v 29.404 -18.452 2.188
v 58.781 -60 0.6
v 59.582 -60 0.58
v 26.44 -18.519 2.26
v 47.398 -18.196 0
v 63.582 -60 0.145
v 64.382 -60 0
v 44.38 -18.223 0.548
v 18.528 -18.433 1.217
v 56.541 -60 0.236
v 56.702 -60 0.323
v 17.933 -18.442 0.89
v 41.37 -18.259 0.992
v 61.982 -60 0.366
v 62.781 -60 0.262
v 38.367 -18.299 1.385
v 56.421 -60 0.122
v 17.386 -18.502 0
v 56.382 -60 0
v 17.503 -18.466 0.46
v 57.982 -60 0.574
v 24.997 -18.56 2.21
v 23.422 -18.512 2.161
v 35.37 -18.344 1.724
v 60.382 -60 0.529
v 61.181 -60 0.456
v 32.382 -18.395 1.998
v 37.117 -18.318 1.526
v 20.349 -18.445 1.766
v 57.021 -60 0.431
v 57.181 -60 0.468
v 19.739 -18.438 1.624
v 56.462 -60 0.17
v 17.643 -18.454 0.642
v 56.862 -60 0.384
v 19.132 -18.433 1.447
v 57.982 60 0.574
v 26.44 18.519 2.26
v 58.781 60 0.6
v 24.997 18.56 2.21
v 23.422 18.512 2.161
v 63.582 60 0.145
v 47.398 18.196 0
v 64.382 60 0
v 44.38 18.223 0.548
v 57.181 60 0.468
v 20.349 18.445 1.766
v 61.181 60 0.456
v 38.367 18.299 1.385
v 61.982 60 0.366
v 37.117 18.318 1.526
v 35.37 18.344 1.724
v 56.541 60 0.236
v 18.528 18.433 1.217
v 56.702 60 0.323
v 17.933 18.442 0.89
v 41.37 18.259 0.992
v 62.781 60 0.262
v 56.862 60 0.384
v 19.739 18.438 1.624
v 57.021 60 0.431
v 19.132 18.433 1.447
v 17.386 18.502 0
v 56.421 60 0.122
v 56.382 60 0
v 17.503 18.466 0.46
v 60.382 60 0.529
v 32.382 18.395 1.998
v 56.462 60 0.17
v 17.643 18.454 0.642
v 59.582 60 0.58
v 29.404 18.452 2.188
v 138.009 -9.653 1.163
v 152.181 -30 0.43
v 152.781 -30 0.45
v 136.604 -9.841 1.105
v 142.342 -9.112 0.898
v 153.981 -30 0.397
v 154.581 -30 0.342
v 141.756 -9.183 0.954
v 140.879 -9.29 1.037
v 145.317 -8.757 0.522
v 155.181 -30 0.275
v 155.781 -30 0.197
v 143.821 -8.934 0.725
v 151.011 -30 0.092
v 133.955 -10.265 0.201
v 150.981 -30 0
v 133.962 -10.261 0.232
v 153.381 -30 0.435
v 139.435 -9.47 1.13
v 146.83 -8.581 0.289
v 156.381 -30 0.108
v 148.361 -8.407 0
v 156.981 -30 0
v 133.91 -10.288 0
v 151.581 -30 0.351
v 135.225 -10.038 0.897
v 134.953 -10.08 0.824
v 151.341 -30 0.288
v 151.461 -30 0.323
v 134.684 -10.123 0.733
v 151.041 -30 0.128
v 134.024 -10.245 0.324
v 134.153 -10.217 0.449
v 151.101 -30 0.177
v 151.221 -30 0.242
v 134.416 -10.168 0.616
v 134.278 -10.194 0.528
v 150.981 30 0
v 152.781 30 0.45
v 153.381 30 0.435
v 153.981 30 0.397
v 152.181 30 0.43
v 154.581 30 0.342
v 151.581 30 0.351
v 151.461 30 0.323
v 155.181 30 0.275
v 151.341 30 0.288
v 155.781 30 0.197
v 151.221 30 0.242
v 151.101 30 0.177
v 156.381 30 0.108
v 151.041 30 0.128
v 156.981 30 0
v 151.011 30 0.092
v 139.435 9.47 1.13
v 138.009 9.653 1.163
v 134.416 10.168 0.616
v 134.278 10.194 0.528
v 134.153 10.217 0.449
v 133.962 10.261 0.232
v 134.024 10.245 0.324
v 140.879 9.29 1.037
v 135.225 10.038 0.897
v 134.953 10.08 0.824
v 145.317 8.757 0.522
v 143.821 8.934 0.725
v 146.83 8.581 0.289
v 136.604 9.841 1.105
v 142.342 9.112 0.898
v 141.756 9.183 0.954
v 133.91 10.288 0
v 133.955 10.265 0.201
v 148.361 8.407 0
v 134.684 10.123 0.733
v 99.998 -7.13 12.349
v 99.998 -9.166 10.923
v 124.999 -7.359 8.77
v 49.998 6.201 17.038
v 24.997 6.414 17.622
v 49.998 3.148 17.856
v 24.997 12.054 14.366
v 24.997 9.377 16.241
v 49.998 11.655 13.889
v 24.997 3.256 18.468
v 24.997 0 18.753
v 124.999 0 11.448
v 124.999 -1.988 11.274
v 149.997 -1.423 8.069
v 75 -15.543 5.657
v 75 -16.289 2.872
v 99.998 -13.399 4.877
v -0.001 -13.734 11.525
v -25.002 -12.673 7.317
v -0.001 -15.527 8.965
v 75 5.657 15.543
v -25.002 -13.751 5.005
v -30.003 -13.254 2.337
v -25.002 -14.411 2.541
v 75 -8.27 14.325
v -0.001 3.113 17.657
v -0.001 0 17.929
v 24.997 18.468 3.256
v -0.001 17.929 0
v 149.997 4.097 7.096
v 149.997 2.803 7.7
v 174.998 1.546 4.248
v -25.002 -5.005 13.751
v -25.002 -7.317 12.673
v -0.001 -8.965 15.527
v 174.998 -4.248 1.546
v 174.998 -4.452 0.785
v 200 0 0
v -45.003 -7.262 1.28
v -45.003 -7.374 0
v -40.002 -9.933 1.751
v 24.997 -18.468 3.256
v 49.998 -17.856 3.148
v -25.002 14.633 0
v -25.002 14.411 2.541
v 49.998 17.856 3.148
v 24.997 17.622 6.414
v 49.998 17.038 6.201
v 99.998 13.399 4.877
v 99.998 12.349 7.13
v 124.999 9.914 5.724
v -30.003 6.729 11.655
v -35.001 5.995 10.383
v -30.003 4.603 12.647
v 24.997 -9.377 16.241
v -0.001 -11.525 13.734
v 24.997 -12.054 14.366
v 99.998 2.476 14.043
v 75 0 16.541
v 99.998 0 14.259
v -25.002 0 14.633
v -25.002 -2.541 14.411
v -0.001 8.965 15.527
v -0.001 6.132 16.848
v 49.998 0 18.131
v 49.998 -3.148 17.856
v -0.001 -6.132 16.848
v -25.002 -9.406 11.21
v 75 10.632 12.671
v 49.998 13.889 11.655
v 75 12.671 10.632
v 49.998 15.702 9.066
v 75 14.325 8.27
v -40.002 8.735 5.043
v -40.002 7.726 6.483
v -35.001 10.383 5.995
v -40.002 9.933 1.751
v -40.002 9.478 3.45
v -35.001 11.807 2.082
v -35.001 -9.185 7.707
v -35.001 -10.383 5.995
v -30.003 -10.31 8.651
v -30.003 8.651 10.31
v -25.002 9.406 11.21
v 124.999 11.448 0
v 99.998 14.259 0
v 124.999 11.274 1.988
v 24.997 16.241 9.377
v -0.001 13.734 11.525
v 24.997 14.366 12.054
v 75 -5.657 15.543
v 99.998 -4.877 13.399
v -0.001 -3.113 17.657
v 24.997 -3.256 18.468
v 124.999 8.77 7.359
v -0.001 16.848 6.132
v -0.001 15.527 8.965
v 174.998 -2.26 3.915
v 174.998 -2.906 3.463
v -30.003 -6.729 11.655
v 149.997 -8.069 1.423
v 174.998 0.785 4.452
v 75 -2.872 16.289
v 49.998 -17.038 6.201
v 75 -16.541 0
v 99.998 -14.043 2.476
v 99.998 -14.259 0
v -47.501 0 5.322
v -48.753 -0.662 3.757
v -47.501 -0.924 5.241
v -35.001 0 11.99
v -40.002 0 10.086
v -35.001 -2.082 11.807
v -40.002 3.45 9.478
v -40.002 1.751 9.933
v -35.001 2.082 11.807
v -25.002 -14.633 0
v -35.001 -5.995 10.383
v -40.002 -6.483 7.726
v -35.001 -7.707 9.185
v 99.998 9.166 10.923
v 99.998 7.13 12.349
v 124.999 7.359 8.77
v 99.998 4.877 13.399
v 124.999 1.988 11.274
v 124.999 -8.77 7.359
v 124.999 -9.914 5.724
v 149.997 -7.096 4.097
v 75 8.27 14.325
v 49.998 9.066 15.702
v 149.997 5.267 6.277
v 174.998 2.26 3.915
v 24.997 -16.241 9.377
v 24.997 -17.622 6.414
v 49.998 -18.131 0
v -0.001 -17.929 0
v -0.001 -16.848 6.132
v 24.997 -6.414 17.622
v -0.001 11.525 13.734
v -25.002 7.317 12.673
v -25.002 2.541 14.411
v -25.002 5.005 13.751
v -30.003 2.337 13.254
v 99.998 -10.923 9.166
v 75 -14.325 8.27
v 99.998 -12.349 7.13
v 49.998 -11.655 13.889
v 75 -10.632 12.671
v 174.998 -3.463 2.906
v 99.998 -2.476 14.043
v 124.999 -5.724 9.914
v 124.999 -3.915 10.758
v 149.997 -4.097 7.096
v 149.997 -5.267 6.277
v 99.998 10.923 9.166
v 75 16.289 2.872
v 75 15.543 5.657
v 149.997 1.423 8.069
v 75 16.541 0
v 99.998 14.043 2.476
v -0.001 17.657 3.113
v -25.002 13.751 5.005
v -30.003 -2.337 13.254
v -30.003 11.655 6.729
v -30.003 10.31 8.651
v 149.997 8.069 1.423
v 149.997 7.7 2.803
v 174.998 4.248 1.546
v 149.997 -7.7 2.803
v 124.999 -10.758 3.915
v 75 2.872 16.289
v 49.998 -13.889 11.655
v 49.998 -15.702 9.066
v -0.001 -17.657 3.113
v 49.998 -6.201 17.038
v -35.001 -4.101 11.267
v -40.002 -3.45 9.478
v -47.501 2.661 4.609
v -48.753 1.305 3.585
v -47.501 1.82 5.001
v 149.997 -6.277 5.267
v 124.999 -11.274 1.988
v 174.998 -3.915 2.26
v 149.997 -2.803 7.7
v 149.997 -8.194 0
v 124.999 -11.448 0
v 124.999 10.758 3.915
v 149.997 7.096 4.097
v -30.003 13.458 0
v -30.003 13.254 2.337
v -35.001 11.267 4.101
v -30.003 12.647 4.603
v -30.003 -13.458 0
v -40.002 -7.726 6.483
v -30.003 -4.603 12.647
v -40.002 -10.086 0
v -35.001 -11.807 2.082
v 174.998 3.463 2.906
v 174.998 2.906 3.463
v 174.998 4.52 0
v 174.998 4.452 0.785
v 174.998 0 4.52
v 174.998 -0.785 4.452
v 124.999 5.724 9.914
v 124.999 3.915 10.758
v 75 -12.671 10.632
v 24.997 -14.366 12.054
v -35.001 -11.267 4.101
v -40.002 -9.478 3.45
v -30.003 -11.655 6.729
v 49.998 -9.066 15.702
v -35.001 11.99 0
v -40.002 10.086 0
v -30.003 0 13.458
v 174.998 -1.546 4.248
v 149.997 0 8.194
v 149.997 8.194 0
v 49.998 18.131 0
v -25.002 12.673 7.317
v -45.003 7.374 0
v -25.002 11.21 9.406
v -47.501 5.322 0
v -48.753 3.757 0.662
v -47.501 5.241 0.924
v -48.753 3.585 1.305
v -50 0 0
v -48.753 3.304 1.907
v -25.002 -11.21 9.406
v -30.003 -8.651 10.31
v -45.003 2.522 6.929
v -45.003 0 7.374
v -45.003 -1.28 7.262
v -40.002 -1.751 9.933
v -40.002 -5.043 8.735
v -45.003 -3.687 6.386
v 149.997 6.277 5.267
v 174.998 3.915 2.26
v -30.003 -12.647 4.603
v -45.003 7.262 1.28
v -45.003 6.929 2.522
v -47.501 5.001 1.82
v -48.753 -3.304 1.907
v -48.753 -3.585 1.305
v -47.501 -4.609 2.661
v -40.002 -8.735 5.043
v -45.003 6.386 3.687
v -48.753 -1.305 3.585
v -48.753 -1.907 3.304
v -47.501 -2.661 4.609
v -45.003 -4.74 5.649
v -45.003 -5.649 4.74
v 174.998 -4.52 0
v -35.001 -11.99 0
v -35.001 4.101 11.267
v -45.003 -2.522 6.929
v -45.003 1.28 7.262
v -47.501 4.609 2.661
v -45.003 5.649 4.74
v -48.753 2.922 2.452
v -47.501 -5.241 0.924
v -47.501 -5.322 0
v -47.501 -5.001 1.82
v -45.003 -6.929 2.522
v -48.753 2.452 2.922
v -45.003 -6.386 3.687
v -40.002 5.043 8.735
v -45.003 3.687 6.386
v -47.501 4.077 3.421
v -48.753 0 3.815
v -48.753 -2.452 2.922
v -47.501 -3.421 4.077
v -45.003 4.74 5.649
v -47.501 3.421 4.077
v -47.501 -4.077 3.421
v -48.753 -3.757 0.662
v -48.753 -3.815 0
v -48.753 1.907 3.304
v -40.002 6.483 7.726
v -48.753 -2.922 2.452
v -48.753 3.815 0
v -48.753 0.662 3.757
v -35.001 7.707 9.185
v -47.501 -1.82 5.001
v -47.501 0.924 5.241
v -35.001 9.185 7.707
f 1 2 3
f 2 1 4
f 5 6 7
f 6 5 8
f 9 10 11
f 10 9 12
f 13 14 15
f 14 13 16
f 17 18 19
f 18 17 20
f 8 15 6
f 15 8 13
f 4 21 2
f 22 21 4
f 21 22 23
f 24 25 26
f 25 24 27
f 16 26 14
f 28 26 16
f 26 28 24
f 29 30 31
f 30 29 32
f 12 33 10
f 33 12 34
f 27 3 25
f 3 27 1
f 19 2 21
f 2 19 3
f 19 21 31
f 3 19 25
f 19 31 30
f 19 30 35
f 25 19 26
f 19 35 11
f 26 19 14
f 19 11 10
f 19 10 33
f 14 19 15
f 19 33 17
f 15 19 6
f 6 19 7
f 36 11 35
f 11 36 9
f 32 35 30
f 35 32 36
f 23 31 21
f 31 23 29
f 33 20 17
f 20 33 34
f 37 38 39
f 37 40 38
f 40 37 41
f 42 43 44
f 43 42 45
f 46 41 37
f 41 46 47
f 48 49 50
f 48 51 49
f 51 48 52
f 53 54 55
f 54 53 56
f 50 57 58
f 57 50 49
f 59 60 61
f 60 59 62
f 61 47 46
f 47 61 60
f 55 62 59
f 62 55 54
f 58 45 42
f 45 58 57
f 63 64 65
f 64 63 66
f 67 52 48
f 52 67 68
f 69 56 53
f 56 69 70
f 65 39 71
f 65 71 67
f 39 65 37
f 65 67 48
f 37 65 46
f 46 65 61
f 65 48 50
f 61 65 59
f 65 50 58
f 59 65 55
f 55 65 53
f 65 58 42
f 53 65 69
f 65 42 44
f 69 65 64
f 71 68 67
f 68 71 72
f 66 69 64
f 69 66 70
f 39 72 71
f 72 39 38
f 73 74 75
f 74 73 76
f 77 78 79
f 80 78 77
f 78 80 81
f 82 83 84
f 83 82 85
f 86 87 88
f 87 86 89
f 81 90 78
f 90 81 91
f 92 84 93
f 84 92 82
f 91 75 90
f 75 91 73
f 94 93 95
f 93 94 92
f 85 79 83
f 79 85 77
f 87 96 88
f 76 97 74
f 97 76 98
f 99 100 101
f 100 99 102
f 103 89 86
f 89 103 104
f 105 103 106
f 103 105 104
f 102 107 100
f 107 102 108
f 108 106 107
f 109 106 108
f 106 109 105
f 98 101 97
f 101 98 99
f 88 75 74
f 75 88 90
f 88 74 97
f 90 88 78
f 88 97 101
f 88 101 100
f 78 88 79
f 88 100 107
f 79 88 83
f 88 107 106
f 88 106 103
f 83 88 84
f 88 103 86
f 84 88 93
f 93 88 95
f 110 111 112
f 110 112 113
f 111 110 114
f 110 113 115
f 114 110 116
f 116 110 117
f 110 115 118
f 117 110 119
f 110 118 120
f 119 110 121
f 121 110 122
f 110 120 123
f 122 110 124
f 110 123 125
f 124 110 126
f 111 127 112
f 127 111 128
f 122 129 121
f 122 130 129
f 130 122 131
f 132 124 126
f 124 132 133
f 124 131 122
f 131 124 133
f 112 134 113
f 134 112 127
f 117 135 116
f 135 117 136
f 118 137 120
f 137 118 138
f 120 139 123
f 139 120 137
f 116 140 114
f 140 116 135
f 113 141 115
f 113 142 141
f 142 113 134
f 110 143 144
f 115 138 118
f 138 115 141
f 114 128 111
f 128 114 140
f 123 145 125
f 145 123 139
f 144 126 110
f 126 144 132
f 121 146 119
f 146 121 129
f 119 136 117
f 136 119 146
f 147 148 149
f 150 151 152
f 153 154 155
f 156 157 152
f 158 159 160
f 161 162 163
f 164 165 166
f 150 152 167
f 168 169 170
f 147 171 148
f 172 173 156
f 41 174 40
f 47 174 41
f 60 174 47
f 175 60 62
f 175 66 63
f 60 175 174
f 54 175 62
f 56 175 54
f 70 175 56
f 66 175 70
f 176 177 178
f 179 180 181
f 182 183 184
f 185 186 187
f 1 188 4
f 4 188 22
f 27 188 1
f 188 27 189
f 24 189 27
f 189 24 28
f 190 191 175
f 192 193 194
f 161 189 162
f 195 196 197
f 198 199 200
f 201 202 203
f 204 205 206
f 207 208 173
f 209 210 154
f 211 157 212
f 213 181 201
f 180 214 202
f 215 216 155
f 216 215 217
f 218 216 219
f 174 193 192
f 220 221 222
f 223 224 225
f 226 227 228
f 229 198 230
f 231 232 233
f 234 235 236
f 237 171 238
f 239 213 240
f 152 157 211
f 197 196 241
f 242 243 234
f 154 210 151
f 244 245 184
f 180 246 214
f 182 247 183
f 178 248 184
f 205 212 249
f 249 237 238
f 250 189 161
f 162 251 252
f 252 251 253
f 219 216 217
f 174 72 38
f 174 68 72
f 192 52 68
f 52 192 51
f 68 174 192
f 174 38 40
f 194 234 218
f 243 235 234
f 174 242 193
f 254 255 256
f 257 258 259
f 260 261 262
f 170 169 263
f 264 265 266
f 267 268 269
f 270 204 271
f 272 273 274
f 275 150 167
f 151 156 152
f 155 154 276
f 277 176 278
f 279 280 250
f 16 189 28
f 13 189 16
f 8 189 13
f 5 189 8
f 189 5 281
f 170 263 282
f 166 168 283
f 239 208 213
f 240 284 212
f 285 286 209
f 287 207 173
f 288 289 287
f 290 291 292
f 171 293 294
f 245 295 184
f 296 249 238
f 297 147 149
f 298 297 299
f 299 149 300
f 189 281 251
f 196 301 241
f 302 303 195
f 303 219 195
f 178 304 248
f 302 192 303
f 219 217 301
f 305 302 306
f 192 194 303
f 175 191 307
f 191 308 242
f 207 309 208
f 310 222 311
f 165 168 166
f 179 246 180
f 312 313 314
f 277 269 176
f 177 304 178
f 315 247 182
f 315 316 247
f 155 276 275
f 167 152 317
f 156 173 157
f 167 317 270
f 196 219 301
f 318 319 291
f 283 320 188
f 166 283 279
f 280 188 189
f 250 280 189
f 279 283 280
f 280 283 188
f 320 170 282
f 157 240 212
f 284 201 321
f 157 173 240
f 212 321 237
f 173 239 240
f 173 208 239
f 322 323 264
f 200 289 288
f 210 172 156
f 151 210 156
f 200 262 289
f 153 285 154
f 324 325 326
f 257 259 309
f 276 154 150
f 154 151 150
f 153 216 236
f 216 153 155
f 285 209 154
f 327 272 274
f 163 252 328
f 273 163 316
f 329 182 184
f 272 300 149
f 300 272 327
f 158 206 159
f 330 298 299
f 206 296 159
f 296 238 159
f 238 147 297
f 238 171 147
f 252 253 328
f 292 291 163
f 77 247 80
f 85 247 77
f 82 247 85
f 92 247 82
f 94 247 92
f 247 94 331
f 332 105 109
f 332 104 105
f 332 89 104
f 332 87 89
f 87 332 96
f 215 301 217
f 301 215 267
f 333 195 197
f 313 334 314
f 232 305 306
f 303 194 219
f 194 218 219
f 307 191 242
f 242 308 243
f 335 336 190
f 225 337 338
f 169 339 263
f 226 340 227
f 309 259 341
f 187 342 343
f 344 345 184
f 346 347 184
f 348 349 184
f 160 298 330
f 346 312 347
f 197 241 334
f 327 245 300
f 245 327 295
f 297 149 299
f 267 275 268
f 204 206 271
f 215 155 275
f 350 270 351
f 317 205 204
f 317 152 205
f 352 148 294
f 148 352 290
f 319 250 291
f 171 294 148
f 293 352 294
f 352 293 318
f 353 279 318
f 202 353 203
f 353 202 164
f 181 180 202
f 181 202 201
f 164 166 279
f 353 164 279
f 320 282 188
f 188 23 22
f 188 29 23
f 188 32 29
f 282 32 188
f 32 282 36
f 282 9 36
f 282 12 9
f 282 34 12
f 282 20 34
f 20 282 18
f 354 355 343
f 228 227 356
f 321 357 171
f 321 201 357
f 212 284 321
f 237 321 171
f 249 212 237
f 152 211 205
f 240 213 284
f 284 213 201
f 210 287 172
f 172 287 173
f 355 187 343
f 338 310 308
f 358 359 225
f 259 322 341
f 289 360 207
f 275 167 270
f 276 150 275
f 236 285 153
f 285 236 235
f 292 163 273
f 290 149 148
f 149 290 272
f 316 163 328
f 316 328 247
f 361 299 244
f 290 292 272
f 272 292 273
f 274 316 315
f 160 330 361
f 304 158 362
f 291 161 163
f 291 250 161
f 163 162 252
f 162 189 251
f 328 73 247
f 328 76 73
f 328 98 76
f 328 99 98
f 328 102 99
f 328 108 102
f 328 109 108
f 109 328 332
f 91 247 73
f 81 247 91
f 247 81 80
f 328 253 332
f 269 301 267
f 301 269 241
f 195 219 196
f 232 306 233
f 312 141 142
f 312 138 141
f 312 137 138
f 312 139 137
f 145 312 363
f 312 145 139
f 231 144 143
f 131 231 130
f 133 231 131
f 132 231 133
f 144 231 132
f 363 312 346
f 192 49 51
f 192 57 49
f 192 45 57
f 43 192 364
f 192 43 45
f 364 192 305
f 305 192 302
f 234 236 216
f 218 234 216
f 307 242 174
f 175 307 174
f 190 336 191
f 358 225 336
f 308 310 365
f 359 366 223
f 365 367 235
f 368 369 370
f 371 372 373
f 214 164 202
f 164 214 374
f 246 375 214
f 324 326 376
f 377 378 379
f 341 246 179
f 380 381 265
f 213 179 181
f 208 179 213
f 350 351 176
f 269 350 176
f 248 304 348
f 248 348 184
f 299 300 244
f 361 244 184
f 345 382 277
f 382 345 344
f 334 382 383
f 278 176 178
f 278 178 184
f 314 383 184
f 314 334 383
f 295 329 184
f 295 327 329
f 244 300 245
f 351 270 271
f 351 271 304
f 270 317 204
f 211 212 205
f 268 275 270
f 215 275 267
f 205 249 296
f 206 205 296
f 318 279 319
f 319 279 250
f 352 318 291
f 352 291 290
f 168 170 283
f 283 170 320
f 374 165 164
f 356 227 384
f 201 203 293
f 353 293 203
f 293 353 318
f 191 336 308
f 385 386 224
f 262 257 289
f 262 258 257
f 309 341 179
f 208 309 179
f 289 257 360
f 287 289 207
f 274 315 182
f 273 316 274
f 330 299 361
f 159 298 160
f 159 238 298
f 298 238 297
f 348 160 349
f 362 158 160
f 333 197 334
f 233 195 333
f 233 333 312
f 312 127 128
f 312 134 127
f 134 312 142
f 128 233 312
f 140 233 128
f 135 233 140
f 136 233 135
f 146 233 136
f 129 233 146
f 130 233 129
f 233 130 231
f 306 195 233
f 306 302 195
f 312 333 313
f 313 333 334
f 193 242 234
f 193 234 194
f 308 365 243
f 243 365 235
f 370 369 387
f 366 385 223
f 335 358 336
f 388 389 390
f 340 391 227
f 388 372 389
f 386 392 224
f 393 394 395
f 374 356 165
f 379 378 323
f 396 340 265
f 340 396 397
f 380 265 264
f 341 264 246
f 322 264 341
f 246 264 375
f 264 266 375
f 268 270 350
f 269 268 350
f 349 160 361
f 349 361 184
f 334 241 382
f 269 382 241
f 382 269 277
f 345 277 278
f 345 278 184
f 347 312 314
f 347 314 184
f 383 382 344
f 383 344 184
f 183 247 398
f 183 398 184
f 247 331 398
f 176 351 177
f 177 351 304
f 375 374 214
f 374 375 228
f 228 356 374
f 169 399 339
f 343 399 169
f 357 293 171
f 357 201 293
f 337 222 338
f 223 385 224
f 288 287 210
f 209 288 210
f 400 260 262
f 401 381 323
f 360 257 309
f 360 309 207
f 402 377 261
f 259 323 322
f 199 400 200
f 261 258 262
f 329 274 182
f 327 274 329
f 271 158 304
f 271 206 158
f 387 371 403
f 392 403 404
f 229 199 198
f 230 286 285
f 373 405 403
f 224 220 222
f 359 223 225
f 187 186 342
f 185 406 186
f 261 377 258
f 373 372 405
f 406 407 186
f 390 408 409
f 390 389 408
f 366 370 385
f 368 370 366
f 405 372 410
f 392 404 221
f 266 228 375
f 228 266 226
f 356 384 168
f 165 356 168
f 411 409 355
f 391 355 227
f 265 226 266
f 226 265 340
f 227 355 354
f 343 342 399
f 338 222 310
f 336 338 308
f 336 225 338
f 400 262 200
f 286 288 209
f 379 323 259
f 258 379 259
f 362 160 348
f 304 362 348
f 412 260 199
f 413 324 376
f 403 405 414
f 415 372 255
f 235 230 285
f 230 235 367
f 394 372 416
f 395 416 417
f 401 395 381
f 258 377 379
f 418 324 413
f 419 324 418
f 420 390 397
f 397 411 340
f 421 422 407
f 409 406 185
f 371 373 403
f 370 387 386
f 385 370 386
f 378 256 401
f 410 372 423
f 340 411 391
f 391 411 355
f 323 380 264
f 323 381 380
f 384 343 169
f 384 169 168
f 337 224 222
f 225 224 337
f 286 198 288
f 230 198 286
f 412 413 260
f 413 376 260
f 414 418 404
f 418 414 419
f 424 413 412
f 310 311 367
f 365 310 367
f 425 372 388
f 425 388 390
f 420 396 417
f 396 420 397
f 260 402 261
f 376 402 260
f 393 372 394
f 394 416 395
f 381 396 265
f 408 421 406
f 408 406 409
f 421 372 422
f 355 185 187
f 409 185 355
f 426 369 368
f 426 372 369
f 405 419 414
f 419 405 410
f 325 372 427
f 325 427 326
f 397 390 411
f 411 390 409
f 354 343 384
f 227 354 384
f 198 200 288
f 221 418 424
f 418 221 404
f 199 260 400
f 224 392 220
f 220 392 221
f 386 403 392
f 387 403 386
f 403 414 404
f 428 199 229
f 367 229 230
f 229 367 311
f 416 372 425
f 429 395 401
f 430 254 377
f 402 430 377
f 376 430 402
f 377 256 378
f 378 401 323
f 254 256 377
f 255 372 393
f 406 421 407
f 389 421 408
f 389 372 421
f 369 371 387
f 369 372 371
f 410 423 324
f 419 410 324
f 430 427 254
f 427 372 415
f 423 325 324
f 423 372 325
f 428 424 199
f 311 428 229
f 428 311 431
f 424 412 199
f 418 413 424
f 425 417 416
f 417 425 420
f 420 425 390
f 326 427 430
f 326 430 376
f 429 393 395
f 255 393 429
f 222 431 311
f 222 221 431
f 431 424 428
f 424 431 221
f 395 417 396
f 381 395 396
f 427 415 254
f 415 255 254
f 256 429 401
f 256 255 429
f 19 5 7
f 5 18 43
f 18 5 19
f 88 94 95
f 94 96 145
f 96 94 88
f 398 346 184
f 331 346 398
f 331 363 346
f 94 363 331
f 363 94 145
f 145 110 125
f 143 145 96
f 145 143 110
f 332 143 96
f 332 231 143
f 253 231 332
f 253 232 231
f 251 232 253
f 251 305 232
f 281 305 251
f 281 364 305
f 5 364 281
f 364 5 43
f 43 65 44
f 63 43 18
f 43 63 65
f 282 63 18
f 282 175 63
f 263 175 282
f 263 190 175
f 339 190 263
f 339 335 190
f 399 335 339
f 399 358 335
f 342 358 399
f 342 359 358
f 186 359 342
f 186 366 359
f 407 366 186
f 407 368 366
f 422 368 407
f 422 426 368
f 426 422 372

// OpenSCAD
// file: naca.scad
// Parametric NACA 00xx airfoil.
// See http://en.wikipedia.org/wiki/NACA_airfoil

// preview[view:south, tilt:top diagonal]

WINGS = 2; // [2:Dual Wings, 1:Single Wing]

// Wing chord (leading edge to trailing edge)
CHORD = 50;

// Wing length (root to tip)
LENGTH = 150;

// Max wing thickness (as percentage of chord length)
t = 15;

// Scale proportion of wing tip vs. wing root
TAPER = 0.5;

// Sweep back angle of wing
SWEEP_ANGLE = 20;

/* [Hidden] */
E = 0.01;

function y(x) = t / 20.0 *
         (.2969 * sqrt(x)
          -0.1260 * x
          -0.3516 * pow(x, 2)
          +0.2843 * pow(x, 3)
          -0.1015 * pow(x, 4));

// Argh!  No for loop initializer in open scad!
a = [[0.0, y(0.0)],
     [0.005, y(0.005)],
     [0.01, y(0.01)],
     [0.02, y(0.02)], [0.04, y(0.04)], [0.06, y(0.06)], [0.08, y(0.08)],
     [0.1, y(0.1)],
     [0.2, y(0.2)],
     [0.3, y(0.3)],
     [0.4, y(0.4)],
     [0.5, y(0.5)],
     [0.6, y(0.6)],
     [0.7, y(0.7)],
     [0.8, y(0.8)],
     [0.9, y(0.9)],
     [1.0, 0.0],
     [0.9, -y(0.9)],
     [0.8, -y(0.8)],
     [0.7, -y(0.7)],
     [0.6, -y(0.6)],
     [0.5, -y(0.5)],
     [0.4, -y(0.4)],
     [0.3, -y(0.3)],
     [0.2, -y(0.2)],
     [0.1, -y(0.1)],
     [0.08, -y(0.08)], [0.06, -y(0.06)], [0.04, -y(0.04)], [0.02, -y(0.02)],
     [0.01, -y(0.01)],
     [0.005, -y(0.005)],
     [0.0, -y(0.0)]
     ];

b = [[0.0, y(0.0)],
     [0.005, y(0.005)],
     [0.01, y(0.01)],
     [0.02, y(0.02)], [0.04, y(0.04)], [0.06, y(0.06)], [0.08, y(0.08)],
     [0.1, y(0.1)],
     [0.2, y(0.2)],
     [0.3, y(0.3)],
     [0.4, y(0.4)],
     [0.5, y(0.5)],
     [0.6, y(0.6)],
     [0.7, y(0.7)],
     [0.8, y(0.8)],
     [0.9, y(0.9)],
     [1.0, 0.0]];

module naca_2d(chord) {
  scale([chord, chord, 1])
    polygon(points=a);
}

module naca_25d(chord) {
  linear_extrude(height=E) naca_2d(chord);
}

module reflect_z() {
  multmatrix(m=[[1, 0, 0, 0],
                [0, 1, 0, 0],
                [0, 0, -1, 0],
                [0, 0, 0, 1]])
    child(0);
}

module naca(chord, length, taper=1, sweep_ang=0) {
  sweep = sin(sweep_ang);
  multmatrix(m=[ [1, 0, sweep, 0],
                 [0, 1, 0, 0],
                 [0, 0, 1, 0],
                 [0, 0, 0, 1]
               ])
   hull() {
     naca_25d(chord);
     translate([0, 0, length - E])
       scale([taper, taper, 1])
         naca_25d(chord);
  }
}

module body(chord) {
  rotate(-90, v=[0, 1, 0])
  rotate_extrude($fn=36)
    rotate(-90, v=[0, 0, 1])
      scale([chord, chord, 1])
        polygon(points=b);
}

module wing(chord, length, taper=1, sweep_ang=0) {
  rotate(90, v=[1, 0, 0])
  union() {
    naca(chord, length, taper, sweep_ang);
    reflect_z()
      naca(chord, length, taper, sweep_ang);
  }
}


translate([-CHORD, 0, 0])
  body(CHORD * 5);

wing(CHORD, LENGTH, TAPER, SWEEP_ANGLE);

translate([CHORD * 2.5, 0, 0]) union() {
  naca(CHORD, LENGTH / 3, TAPER, SWEEP_ANGLE * 3);
  wing(CHORD, LENGTH / 3, TAPER, SWEEP_ANGLE * 3);
}
// main file
use <naca.scad>;

difference() {

union() {
  translate([-50, 0, 0]) body(250);
  wing(40, 60, 0.2, 70);
  translate([125, 0, 0]) wing(20, 30, 0.3, 60);
}

translate([50, 0, -25]) cube([300, 200, 50], center=true);
}
